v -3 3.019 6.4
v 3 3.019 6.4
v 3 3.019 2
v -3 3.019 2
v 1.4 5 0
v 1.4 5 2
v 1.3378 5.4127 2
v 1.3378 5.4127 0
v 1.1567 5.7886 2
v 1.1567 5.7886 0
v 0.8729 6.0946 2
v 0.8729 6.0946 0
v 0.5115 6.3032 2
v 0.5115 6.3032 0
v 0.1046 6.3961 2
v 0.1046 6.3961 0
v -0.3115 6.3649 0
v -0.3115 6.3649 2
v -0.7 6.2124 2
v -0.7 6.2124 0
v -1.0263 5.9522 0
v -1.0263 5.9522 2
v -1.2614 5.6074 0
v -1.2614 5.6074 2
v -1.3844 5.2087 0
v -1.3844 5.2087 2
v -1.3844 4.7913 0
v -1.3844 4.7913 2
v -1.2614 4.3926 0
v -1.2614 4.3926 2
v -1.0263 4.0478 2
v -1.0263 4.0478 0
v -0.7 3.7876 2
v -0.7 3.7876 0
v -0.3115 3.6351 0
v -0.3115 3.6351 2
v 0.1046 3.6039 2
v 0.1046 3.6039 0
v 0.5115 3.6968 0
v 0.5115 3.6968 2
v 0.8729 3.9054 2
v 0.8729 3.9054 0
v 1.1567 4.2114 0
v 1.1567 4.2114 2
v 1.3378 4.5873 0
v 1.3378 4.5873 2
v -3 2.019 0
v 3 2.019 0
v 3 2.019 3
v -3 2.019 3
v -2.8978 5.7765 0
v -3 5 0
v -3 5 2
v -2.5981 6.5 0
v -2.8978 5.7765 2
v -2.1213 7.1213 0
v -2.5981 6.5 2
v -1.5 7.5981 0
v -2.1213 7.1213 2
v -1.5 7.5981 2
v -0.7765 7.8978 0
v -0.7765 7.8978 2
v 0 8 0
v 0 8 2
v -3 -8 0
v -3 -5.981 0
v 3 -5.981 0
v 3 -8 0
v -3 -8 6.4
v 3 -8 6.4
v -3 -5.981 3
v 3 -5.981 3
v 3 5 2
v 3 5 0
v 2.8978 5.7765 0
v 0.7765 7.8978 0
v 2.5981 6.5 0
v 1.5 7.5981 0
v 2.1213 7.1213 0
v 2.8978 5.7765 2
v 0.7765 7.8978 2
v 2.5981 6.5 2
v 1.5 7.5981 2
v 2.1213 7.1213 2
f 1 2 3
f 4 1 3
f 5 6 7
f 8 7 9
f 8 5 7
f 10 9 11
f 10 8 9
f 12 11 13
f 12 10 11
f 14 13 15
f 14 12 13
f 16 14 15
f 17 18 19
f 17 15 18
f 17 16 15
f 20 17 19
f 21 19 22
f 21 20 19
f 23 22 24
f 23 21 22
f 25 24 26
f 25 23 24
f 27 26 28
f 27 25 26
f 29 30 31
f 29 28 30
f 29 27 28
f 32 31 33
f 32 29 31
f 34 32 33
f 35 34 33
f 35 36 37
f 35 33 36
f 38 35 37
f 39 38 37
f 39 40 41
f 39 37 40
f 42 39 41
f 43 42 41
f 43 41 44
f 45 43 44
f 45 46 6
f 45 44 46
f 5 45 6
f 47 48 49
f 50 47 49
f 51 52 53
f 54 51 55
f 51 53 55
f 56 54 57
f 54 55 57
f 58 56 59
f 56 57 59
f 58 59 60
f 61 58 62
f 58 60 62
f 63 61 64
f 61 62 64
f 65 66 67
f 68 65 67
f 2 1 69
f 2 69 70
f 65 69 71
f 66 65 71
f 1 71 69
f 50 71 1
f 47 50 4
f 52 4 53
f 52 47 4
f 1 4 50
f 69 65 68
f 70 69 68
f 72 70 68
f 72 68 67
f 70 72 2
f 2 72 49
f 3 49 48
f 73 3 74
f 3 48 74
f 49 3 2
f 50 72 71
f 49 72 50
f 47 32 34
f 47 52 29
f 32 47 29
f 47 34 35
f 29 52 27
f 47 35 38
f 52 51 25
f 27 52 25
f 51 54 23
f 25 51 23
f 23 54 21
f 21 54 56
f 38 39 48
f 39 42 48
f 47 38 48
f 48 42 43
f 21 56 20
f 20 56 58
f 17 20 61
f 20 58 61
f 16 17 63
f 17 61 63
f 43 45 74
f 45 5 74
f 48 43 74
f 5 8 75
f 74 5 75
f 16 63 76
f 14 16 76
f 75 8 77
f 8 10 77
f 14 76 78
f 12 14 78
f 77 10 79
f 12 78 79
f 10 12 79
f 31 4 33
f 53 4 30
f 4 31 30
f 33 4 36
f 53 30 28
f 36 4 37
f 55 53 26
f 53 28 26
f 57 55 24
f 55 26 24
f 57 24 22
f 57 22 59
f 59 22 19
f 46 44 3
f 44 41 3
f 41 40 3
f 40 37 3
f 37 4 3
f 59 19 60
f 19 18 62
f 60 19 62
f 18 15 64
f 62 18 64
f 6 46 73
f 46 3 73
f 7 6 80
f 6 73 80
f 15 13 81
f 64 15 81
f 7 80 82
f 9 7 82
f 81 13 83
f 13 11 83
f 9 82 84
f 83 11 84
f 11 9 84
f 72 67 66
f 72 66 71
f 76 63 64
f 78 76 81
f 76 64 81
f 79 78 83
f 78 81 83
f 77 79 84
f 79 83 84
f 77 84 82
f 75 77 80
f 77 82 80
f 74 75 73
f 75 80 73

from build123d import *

# Parameters (mm, degrees)
F0_W     = 6
F0_H     = 16
F0_R     = 1.4
F1_DEPTH = 6.4
F2_R     = 2.99999
F3_W     = 1.9810468791
F3_H     = 4.4
F3_W_2   = 8
F3_H_2   = 3
F4_DEPTH = 8


# Not quite as in the source:
# - a fillet or chamfer is up to 0.001 mm smaller than in the source, because OpenCascade refuses the exact size


with BuildPart() as f1:
    # F0 (on Top) → F1 (new body)
    with BuildSketch(Plane.XY):
        Rectangle(F0_W, F0_H)
        with Locations((0, 5)):
            Circle(F0_R, mode=Mode.SUBTRACT)
    extrude(amount=F1_DEPTH)

    # F2 (radius 3 in the source; OpenCascade refuses exactly that, so slightly less here)
    f2_edges = [f1.edges().sort_by_distance(p)[0] for p in [
        (3, 8, 3.2),
        (-3, 8, 3.2),
    ]]
    fillet(f2_edges, radius=F2_R)

    # F3 (on face) → F4 (cut)
    with BuildSketch(Plane.YZ.offset(3)):
        Polygon((5.00001, 6.4), (5.00001, 2), (8.0189631209, 2), (8.0189631209, 7), (3.0189631209, 7), (3.0189631209, 6.4), align=None)
        with Locations((4.0094865604, 4.2)):
            Rectangle(F3_W, F3_H)
        with Locations((-1.9810368791, 1.5)):
            Rectangle(F3_W_2, F3_H_2)
    extrude(amount=-F4_DEPTH, mode=Mode.SUBTRACT)


solid = f1.part
